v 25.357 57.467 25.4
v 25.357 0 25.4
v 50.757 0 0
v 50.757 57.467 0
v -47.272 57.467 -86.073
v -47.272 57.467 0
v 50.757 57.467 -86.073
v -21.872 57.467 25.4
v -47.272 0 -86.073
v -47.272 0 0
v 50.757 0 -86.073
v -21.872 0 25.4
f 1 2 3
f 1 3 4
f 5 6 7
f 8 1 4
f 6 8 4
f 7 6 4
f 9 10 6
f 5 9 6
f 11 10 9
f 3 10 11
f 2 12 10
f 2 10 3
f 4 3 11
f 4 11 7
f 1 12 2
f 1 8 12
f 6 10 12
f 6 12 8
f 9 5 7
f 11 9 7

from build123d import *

# Parameters (mm, degrees)
F0_W     = 98.028793931
F0_H     = 57.4665814638
F1_DEPTH = 25.4
F2_SIZE  = 25.39999
F3_SIZE  = 25.39999
F4_DEPTH = 86.0725715756


# Not quite as in the source:
# - a fillet or chamfer is up to 0.001 mm smaller than in the source, because OpenCascade refuses the exact size


with BuildPart() as f1:
    # F0 (on Top) → F1 (new body)
    with BuildSketch(Plane.XY):
        with Locations((1.7422363162, 28.7332907319)):
            Rectangle(F0_W, F0_H)
    extrude(amount=F1_DEPTH)

    # F2 (size 25.4 in the source; OpenCascade refuses exactly that, so slightly less here)
    f2_edges = [f1.edges().sort_by_distance(p)[0] for p in [
        (50.756633, 28.733291, 25.4),
    ]]
    chamfer(f2_edges, length=F2_SIZE)

    # F3 (size 25.4 in the source; OpenCascade refuses exactly that, so slightly less here)
    f3_edges = [f1.edges().sort_by_distance(p)[0] for p in [
        (-47.272161, 28.733291, 25.4),
    ]]
    chamfer(f3_edges, length=F3_SIZE)

    # F4 (add): a face of the model
    f4_faces = [f1.faces().sort_by_distance(p)[0] for p in [
        (1.7422363162, 28.7332907319, 0),
    ]]
    extrude(f4_faces, amount=F4_DEPTH)


solid = f1.part
